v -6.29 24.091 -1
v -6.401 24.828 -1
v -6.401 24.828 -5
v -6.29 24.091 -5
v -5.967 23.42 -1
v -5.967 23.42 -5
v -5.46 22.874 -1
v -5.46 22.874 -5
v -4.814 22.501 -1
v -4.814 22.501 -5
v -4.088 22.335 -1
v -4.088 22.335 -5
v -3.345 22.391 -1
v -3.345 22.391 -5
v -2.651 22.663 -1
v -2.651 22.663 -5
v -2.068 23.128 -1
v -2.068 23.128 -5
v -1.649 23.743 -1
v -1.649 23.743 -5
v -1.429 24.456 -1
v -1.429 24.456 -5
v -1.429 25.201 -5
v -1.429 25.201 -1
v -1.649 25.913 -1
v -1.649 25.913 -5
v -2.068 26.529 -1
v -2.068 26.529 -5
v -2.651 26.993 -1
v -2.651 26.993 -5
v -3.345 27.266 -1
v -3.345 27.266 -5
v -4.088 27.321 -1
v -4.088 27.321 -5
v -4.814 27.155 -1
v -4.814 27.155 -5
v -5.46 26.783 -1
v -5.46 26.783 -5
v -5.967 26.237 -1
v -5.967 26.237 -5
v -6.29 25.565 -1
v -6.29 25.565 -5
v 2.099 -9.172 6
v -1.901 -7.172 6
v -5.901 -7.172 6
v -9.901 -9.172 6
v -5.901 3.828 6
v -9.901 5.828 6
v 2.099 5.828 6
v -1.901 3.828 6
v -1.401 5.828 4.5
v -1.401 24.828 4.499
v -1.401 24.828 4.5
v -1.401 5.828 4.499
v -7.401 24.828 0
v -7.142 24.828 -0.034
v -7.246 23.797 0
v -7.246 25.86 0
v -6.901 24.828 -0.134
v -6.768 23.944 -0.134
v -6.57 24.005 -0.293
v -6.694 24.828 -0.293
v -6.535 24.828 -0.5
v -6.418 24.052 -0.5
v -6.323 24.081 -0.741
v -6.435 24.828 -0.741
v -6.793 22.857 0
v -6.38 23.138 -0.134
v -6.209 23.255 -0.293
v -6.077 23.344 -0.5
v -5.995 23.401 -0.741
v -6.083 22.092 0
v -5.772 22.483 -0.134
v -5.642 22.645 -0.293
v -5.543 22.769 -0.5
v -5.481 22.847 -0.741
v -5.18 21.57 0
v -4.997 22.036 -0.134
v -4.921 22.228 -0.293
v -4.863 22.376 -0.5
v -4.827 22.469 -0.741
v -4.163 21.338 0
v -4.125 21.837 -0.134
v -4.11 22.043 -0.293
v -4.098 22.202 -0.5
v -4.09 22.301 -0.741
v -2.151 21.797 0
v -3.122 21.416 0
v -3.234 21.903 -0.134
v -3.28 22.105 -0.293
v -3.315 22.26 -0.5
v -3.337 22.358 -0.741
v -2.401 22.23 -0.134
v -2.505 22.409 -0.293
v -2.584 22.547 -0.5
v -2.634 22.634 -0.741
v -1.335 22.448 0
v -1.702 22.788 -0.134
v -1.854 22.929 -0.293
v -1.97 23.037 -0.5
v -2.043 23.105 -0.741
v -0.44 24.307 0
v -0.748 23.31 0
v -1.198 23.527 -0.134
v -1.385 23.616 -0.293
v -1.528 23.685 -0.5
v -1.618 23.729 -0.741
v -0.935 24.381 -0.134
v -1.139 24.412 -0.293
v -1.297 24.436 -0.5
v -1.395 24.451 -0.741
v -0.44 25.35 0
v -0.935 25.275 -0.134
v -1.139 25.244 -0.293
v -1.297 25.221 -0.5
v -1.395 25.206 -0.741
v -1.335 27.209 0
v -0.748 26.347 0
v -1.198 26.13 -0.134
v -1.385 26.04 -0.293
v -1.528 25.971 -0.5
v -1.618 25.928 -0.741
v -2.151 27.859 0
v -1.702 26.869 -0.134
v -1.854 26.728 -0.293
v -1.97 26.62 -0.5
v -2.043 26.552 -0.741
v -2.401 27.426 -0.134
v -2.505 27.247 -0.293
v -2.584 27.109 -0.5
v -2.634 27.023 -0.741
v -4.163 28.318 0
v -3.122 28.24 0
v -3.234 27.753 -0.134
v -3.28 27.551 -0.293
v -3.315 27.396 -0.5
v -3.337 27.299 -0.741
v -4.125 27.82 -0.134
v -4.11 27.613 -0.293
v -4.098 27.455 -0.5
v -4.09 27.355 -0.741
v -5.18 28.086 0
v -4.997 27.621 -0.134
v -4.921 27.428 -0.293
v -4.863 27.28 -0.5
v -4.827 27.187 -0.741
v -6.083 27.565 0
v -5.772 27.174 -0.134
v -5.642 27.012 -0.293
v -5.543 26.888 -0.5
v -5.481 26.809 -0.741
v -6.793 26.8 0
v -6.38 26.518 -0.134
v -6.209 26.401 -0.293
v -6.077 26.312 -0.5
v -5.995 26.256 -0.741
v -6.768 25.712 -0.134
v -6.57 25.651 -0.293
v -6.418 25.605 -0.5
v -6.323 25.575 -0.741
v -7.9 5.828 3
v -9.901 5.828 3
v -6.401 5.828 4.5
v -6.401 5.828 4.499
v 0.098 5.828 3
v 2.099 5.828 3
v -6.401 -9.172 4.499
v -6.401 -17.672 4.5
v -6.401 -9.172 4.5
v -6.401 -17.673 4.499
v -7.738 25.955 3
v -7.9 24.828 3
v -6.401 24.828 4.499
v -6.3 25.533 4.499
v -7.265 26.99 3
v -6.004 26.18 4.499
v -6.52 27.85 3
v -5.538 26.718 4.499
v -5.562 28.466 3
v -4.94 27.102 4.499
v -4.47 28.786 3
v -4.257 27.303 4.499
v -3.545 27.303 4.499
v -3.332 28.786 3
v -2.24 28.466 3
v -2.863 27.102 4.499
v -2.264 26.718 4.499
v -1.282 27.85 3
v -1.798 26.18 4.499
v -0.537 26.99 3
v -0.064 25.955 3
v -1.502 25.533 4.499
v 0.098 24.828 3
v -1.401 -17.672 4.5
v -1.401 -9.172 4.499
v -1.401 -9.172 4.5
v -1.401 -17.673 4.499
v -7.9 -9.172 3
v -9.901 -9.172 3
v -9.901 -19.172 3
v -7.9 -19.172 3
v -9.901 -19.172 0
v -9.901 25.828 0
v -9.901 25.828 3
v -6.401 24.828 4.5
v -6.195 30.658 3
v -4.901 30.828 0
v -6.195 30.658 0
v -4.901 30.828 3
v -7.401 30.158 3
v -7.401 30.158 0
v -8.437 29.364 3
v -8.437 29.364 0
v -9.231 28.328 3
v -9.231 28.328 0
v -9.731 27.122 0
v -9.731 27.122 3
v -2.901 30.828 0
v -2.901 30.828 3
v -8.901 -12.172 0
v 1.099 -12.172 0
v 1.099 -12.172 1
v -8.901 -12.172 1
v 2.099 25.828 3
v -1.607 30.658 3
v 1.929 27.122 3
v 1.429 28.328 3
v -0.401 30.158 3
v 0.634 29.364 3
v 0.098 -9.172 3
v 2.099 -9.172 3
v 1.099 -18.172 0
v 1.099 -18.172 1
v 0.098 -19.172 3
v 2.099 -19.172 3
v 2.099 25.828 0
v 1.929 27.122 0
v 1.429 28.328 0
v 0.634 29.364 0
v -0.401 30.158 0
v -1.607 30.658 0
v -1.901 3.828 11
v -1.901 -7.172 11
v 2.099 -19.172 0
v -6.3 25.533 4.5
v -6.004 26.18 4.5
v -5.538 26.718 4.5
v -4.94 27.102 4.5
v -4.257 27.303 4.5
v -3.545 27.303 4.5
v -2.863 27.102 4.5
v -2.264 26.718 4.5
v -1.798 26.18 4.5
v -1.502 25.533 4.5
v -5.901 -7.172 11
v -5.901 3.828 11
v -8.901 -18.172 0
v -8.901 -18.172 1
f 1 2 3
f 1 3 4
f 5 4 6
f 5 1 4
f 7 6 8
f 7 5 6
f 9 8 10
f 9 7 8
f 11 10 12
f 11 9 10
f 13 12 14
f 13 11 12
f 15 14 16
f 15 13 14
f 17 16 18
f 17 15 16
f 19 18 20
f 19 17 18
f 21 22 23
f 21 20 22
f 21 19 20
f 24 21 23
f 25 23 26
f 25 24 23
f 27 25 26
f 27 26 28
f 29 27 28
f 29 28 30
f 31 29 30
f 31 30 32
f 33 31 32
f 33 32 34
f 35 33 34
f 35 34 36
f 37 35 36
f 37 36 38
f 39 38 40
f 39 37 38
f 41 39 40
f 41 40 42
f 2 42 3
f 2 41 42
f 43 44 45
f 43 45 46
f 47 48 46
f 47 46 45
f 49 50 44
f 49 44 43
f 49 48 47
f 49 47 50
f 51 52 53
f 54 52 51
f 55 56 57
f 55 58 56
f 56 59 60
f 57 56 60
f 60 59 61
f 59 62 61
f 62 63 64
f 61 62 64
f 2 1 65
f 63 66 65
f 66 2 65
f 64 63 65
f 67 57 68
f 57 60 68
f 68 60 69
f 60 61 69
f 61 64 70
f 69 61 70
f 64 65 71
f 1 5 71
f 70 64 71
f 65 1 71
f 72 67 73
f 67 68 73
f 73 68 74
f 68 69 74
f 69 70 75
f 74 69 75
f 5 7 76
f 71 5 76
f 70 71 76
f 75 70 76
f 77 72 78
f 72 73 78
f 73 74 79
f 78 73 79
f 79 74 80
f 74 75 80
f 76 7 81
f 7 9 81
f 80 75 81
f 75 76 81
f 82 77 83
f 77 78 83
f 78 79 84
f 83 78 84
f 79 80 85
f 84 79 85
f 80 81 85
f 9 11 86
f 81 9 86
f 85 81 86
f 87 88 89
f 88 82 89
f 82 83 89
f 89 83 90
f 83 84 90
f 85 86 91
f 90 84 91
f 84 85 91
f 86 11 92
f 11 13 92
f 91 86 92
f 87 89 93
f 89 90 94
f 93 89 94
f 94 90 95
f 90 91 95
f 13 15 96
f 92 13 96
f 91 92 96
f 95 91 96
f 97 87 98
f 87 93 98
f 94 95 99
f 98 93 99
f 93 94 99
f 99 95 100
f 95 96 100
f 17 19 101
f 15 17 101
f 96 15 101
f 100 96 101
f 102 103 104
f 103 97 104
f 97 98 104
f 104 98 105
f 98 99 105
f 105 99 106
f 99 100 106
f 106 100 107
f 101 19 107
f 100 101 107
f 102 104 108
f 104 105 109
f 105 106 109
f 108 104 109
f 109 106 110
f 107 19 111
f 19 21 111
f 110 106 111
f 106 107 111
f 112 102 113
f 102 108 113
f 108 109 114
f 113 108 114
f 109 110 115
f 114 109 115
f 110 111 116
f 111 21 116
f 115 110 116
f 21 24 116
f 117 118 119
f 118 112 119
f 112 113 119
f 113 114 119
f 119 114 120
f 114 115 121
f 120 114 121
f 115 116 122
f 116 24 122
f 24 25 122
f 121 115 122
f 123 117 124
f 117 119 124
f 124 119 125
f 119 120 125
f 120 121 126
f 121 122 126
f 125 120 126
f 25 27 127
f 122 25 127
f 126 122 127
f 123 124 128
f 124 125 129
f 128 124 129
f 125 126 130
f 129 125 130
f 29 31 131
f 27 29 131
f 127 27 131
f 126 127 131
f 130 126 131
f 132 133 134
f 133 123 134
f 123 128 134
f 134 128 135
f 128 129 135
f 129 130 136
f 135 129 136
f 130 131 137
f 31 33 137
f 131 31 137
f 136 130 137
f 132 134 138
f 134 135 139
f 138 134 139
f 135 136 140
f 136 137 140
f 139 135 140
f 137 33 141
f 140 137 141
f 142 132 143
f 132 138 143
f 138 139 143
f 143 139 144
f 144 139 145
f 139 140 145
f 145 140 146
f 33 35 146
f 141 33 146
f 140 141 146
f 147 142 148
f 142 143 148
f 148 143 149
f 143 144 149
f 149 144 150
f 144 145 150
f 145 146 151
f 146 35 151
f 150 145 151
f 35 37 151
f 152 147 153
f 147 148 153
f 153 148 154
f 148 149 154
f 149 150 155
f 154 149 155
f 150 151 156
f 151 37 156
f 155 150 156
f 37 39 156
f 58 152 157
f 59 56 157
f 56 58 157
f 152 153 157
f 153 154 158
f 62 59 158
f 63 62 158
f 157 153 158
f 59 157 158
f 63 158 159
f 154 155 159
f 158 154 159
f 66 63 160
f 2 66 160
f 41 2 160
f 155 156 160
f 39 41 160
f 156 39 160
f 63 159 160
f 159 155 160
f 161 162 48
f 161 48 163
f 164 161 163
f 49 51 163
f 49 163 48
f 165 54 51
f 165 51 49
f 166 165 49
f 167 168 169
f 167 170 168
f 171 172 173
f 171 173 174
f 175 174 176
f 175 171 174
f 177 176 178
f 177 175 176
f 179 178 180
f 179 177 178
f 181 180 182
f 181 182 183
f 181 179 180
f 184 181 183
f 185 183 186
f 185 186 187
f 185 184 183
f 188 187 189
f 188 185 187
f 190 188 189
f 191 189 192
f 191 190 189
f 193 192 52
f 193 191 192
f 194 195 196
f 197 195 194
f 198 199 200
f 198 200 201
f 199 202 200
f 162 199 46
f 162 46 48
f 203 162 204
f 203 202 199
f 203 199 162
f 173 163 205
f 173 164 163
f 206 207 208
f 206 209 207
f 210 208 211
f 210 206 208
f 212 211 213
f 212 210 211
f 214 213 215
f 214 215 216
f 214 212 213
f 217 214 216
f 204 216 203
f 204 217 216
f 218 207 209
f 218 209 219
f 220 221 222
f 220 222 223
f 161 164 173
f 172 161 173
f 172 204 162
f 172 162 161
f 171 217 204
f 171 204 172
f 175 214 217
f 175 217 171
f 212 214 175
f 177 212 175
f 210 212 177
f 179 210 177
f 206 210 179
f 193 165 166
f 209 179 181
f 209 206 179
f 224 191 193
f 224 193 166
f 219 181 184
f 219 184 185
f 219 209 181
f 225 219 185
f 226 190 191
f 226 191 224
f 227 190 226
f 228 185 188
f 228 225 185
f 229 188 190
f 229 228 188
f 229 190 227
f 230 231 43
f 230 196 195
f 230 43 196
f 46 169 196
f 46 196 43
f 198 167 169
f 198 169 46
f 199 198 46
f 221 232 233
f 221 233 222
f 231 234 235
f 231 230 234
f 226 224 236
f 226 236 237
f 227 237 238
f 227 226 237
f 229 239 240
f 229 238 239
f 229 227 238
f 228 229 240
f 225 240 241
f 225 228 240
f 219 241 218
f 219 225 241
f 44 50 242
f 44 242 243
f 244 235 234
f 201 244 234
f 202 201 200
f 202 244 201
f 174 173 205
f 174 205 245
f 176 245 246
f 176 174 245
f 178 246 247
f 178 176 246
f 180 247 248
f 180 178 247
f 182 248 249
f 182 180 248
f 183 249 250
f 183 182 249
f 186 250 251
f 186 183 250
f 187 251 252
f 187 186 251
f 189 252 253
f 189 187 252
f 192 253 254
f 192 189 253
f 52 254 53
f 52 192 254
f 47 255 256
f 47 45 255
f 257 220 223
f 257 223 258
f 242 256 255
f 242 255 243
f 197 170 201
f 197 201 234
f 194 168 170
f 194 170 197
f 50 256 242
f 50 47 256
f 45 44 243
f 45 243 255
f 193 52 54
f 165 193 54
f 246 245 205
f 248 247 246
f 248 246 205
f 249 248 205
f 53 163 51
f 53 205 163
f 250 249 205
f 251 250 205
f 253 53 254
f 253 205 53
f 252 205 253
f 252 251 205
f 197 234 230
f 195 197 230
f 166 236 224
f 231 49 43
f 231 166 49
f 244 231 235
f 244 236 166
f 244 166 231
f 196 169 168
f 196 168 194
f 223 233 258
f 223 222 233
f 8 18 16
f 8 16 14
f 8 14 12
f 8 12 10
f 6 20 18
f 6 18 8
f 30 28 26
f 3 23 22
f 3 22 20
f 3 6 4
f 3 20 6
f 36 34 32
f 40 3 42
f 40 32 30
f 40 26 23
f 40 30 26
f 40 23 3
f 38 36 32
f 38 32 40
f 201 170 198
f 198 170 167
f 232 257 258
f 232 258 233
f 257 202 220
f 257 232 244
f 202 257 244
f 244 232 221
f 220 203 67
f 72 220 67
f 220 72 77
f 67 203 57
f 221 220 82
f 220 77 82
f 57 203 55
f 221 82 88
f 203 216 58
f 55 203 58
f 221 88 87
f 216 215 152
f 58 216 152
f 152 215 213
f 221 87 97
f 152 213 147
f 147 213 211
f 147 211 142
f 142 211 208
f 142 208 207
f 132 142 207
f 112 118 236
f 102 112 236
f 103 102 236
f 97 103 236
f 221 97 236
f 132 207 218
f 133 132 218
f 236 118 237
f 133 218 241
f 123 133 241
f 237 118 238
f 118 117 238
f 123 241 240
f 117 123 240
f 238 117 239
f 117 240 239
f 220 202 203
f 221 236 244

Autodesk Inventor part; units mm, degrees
ref_plane "YZ Plane" through (0, 0, 0) normal (1, 0, 0) x (0, 1, 0)
ref_plane "XZ Plane" through (0, 0, 0) normal (0, 1, 0) x (-1, 0, 0)
ref_plane "XY Plane" through (0, 0, 0) normal (0, 0, 1) x (1, 0, 0)
sketch "Sketch1" plane through (0, 0, 0) normal (0, 0, 1) x (1, 0, 0)
  line L0 (-9.9011, 30.8282) -> (2.0989, 30.8282)
  line L1 (2.0989, 30.8282) -> (2.0989, -19.1718)
  line L2 (2.0989, -19.1718) -> (-9.9011, -19.1718)
  line L3 (-9.9011, -19.1718) -> (-9.9011, 30.8282)
  point P0 (0, 0)
  dimension "d0" = 50
  dimension "d1" = 12
extrude "Extrusion1" add sketch "Sketch1" along normal blind 3
sketch "Sketch2" plane through (0, 0, 0) normal (0, 0, -1) x (-1, 0, 0)
  line L0 (-2.0989, -19.1718) -> (-2.0989, 30.8282) projected
  line L1 (9.9011, -19.1718) -> (-2.0989, -19.1718) projected
  line L2 (-2.0989, -11.1718) -> (9.9011, -11.1718)
  line L3 (9.9011, -11.1718) -> (9.9011, -19.1718)
  line L4 (9.9011, -19.1718) -> (-2.0989, -19.1718)
  line L5 (-2.0989, -19.1718) -> (-2.0989, -11.1718)
  line L6 (-1.0989, -12.1718) -> (8.9011, -12.1718)
  line L7 (8.9011, -12.1718) -> (8.9011, -18.1718)
  line L8 (8.9011, -18.1718) -> (-1.0989, -18.1718)
  line L9 (-1.0989, -18.1718) -> (-1.0989, -12.1718)
  point P0 (0, 0)
  dimension "d4" = 8
  dimension "d5" = 10
  dimension "d6" = 6
  dimension "d7" = 1
  dimension "d8" = 1
  dimension "d9" = 12
extrude "Extrusion2" cut sketch "Sketch2" against normal blind 1 contours L6 L7 L8 L9
sketch "Sketch3" plane through (0, 0, 0) normal (0, 0, -1) x (-1, 0, 0)
  line L0 (-2.0989, -19.1718) -> (-2.0989, 30.8282) projected
  line L1 (-2.0989, 30.8282) -> (9.9011, 30.8282) projected
  line L2 (9.9011, 30.8282) -> (9.9011, -19.1718) projected
  circle A0 centre (3.9011, 24.8282) radius 2.5
  line L3 (-2.0989, 30.8282) -> (9.9011, 30.8282)
  line L4 (9.9011, 30.8282) -> (9.9011, 18.8282)
  line L5 (9.9011, 18.8282) -> (-2.0989, 18.8282)
  line L6 (-2.0989, 18.8282) -> (-2.0989, 30.8282)
  point P0 (0, 0)
  dimension "d12" = 5
  dimension "d13" = 6
  dimension "d14" = 12
  dimension "d15" = 12
  dimension "d16" = 6
extrude "Extrusion3" add sketch "Sketch3" along normal blind 5 contours A0
fillet "Fillet1" radius 1 1 edges at (-1.4011, 24.8282, 0)
sketch "Sketch4" plane through (0, 0, 3) normal (0, 0, 1) x (1, 0, 0)
  line L0 (2.0989, -19.1718) -> (2.0989, 30.8282) projected
  line L1 (-9.9011, 5.8282) -> (2.0989, 5.8282)
  line L2 (2.0989, 5.8282) -> (2.0989, -9.1718)
  line L3 (2.0989, -9.1718) -> (-9.9011, -9.1718)
  line L4 (-9.9011, -9.1718) -> (-9.9011, 5.8282)
  line L5 (-9.9011, 30.8282) -> (-9.9011, -19.1718) projected
  line L6 (-9.9011, -19.1718) -> (2.0989, -19.1718) projected
  line L7 (2.0989, -19.1718) -> (2.0989, 30.8282) projected
  line L8 (2.0989, 30.8282) -> (-9.9011, 30.8282) projected
  line L9 (-9.9011, 30.8282) -> (-9.9011, -19.1718) projected
  point P0 (0, 0)
  point P1 (2.0989, 5.8282)
  dimension "d20" = 15
  dimension "d21" = 10
extrude "Extrusion4" add sketch "Sketch4" along normal blind 3 contours L3 L4 L1 L0
sketch "Sketch5" plane through (0, 0, 6) normal (0, 0, 1) x (1, 0, 0)
  line L0 (-5.9011, 3.8282) -> (-1.9011, 3.8282)
  line L1 (-1.9011, 3.8282) -> (-1.9011, -7.1718)
  line L2 (-1.9011, -7.1718) -> (-5.9011, -7.1718)
  line L3 (-5.9011, -7.1718) -> (-5.9011, 3.8282)
  line L4 (-9.9011, -9.1718) -> (2.0989, -9.1718) projected
  line L5 (2.0989, -9.1718) -> (2.0989, 5.8282) projected
  line L6 (2.0989, 5.8282) -> (-9.9011, 5.8282) projected
  line L7 (-9.9011, 5.8282) -> (-9.9011, -9.1718) projected
  point P0 (0, 0)
  dimension "d24" = 12
  dimension "d25" = 15
  dimension "d26" = 4
  dimension "d27" = 11
  dimension "d28" = 4
  dimension "d29" = 2
extrude "Extrusion5" add sketch "Sketch5" along normal blind 5 contours L0 L1 L2 L3
fillet "Fillet2" radius 5 2 edges at (-9.9011, 30.8282, 1.5) (2.0989, 30.8282, 1.5)
sketch "Sketch6" plane through (0, 0, 3) normal (0, 0, 1) x (1, 0, 0)
  circle A0 centre (-3.9011, 24.8282) radius 2.5 projected
  line L0 (-6.4011, 24.8282) -> (-1.4011, 24.8282)
  line L1 (-1.4011, 24.8282) -> (-1.4011, 5.8282)
  line L2 (-1.4011, 5.8282) -> (-6.4011, 5.8282)
  line L3 (-6.4011, 5.8282) -> (-6.4011, 24.8282)
  line L4 (2.0989, 5.8282) -> (-9.9011, 5.8282) projected
  line L5 (2.0989, -9.1718) -> (-9.9011, -9.1718) projected
  line L6 (-6.4011, -9.1718) -> (-1.4011, -9.1718)
  line L7 (-1.4011, -9.1718) -> (-1.4011, -19.1718)
  line L8 (-1.4011, -19.1718) -> (-6.4011, -19.1718)
  line L9 (-6.4011, -19.1718) -> (-6.4011, -9.1718)
  line L10 (-9.9011, -19.1718) -> (2.0989, -19.1718) projected
  point P0 (0, 0)
  point P1 (-1.4011, -9.1718)
  dimension "d38" = 5
  dimension "d39" = 5
extrude "Extrusion6" add sketch "Sketch6" along normal blind 1.5
chamfer "Chamfer1" distance 1.5 angle 45 6 edges at (-1.4011, 15.3282, 3) (-3.9011, 27.3282, 3) (-6.4011, 15.3282, 3) (-6.4011, -14.1718, 3) (-1.4011, -14.1718, 3) (-3.9011, -19.1718, 4.5)
equation "\"d7\" = -0.5 * d5 + 0.5 * d9"
equation "\"d8\" = -0.5 * d6 + 0.5 * d4"
equation "\"d13\" = 0.5 * d14"
equation "\"d15\" = d14"
equation "\"d16\" = 0.5 * d14"
equation "\"d26\" = 0.333333 * d24"
equation "\"d28\" = -0.5 * d26 + 0.5 * d24"
equation "\"d39\" = d38"
properties part number "wheel connector"
